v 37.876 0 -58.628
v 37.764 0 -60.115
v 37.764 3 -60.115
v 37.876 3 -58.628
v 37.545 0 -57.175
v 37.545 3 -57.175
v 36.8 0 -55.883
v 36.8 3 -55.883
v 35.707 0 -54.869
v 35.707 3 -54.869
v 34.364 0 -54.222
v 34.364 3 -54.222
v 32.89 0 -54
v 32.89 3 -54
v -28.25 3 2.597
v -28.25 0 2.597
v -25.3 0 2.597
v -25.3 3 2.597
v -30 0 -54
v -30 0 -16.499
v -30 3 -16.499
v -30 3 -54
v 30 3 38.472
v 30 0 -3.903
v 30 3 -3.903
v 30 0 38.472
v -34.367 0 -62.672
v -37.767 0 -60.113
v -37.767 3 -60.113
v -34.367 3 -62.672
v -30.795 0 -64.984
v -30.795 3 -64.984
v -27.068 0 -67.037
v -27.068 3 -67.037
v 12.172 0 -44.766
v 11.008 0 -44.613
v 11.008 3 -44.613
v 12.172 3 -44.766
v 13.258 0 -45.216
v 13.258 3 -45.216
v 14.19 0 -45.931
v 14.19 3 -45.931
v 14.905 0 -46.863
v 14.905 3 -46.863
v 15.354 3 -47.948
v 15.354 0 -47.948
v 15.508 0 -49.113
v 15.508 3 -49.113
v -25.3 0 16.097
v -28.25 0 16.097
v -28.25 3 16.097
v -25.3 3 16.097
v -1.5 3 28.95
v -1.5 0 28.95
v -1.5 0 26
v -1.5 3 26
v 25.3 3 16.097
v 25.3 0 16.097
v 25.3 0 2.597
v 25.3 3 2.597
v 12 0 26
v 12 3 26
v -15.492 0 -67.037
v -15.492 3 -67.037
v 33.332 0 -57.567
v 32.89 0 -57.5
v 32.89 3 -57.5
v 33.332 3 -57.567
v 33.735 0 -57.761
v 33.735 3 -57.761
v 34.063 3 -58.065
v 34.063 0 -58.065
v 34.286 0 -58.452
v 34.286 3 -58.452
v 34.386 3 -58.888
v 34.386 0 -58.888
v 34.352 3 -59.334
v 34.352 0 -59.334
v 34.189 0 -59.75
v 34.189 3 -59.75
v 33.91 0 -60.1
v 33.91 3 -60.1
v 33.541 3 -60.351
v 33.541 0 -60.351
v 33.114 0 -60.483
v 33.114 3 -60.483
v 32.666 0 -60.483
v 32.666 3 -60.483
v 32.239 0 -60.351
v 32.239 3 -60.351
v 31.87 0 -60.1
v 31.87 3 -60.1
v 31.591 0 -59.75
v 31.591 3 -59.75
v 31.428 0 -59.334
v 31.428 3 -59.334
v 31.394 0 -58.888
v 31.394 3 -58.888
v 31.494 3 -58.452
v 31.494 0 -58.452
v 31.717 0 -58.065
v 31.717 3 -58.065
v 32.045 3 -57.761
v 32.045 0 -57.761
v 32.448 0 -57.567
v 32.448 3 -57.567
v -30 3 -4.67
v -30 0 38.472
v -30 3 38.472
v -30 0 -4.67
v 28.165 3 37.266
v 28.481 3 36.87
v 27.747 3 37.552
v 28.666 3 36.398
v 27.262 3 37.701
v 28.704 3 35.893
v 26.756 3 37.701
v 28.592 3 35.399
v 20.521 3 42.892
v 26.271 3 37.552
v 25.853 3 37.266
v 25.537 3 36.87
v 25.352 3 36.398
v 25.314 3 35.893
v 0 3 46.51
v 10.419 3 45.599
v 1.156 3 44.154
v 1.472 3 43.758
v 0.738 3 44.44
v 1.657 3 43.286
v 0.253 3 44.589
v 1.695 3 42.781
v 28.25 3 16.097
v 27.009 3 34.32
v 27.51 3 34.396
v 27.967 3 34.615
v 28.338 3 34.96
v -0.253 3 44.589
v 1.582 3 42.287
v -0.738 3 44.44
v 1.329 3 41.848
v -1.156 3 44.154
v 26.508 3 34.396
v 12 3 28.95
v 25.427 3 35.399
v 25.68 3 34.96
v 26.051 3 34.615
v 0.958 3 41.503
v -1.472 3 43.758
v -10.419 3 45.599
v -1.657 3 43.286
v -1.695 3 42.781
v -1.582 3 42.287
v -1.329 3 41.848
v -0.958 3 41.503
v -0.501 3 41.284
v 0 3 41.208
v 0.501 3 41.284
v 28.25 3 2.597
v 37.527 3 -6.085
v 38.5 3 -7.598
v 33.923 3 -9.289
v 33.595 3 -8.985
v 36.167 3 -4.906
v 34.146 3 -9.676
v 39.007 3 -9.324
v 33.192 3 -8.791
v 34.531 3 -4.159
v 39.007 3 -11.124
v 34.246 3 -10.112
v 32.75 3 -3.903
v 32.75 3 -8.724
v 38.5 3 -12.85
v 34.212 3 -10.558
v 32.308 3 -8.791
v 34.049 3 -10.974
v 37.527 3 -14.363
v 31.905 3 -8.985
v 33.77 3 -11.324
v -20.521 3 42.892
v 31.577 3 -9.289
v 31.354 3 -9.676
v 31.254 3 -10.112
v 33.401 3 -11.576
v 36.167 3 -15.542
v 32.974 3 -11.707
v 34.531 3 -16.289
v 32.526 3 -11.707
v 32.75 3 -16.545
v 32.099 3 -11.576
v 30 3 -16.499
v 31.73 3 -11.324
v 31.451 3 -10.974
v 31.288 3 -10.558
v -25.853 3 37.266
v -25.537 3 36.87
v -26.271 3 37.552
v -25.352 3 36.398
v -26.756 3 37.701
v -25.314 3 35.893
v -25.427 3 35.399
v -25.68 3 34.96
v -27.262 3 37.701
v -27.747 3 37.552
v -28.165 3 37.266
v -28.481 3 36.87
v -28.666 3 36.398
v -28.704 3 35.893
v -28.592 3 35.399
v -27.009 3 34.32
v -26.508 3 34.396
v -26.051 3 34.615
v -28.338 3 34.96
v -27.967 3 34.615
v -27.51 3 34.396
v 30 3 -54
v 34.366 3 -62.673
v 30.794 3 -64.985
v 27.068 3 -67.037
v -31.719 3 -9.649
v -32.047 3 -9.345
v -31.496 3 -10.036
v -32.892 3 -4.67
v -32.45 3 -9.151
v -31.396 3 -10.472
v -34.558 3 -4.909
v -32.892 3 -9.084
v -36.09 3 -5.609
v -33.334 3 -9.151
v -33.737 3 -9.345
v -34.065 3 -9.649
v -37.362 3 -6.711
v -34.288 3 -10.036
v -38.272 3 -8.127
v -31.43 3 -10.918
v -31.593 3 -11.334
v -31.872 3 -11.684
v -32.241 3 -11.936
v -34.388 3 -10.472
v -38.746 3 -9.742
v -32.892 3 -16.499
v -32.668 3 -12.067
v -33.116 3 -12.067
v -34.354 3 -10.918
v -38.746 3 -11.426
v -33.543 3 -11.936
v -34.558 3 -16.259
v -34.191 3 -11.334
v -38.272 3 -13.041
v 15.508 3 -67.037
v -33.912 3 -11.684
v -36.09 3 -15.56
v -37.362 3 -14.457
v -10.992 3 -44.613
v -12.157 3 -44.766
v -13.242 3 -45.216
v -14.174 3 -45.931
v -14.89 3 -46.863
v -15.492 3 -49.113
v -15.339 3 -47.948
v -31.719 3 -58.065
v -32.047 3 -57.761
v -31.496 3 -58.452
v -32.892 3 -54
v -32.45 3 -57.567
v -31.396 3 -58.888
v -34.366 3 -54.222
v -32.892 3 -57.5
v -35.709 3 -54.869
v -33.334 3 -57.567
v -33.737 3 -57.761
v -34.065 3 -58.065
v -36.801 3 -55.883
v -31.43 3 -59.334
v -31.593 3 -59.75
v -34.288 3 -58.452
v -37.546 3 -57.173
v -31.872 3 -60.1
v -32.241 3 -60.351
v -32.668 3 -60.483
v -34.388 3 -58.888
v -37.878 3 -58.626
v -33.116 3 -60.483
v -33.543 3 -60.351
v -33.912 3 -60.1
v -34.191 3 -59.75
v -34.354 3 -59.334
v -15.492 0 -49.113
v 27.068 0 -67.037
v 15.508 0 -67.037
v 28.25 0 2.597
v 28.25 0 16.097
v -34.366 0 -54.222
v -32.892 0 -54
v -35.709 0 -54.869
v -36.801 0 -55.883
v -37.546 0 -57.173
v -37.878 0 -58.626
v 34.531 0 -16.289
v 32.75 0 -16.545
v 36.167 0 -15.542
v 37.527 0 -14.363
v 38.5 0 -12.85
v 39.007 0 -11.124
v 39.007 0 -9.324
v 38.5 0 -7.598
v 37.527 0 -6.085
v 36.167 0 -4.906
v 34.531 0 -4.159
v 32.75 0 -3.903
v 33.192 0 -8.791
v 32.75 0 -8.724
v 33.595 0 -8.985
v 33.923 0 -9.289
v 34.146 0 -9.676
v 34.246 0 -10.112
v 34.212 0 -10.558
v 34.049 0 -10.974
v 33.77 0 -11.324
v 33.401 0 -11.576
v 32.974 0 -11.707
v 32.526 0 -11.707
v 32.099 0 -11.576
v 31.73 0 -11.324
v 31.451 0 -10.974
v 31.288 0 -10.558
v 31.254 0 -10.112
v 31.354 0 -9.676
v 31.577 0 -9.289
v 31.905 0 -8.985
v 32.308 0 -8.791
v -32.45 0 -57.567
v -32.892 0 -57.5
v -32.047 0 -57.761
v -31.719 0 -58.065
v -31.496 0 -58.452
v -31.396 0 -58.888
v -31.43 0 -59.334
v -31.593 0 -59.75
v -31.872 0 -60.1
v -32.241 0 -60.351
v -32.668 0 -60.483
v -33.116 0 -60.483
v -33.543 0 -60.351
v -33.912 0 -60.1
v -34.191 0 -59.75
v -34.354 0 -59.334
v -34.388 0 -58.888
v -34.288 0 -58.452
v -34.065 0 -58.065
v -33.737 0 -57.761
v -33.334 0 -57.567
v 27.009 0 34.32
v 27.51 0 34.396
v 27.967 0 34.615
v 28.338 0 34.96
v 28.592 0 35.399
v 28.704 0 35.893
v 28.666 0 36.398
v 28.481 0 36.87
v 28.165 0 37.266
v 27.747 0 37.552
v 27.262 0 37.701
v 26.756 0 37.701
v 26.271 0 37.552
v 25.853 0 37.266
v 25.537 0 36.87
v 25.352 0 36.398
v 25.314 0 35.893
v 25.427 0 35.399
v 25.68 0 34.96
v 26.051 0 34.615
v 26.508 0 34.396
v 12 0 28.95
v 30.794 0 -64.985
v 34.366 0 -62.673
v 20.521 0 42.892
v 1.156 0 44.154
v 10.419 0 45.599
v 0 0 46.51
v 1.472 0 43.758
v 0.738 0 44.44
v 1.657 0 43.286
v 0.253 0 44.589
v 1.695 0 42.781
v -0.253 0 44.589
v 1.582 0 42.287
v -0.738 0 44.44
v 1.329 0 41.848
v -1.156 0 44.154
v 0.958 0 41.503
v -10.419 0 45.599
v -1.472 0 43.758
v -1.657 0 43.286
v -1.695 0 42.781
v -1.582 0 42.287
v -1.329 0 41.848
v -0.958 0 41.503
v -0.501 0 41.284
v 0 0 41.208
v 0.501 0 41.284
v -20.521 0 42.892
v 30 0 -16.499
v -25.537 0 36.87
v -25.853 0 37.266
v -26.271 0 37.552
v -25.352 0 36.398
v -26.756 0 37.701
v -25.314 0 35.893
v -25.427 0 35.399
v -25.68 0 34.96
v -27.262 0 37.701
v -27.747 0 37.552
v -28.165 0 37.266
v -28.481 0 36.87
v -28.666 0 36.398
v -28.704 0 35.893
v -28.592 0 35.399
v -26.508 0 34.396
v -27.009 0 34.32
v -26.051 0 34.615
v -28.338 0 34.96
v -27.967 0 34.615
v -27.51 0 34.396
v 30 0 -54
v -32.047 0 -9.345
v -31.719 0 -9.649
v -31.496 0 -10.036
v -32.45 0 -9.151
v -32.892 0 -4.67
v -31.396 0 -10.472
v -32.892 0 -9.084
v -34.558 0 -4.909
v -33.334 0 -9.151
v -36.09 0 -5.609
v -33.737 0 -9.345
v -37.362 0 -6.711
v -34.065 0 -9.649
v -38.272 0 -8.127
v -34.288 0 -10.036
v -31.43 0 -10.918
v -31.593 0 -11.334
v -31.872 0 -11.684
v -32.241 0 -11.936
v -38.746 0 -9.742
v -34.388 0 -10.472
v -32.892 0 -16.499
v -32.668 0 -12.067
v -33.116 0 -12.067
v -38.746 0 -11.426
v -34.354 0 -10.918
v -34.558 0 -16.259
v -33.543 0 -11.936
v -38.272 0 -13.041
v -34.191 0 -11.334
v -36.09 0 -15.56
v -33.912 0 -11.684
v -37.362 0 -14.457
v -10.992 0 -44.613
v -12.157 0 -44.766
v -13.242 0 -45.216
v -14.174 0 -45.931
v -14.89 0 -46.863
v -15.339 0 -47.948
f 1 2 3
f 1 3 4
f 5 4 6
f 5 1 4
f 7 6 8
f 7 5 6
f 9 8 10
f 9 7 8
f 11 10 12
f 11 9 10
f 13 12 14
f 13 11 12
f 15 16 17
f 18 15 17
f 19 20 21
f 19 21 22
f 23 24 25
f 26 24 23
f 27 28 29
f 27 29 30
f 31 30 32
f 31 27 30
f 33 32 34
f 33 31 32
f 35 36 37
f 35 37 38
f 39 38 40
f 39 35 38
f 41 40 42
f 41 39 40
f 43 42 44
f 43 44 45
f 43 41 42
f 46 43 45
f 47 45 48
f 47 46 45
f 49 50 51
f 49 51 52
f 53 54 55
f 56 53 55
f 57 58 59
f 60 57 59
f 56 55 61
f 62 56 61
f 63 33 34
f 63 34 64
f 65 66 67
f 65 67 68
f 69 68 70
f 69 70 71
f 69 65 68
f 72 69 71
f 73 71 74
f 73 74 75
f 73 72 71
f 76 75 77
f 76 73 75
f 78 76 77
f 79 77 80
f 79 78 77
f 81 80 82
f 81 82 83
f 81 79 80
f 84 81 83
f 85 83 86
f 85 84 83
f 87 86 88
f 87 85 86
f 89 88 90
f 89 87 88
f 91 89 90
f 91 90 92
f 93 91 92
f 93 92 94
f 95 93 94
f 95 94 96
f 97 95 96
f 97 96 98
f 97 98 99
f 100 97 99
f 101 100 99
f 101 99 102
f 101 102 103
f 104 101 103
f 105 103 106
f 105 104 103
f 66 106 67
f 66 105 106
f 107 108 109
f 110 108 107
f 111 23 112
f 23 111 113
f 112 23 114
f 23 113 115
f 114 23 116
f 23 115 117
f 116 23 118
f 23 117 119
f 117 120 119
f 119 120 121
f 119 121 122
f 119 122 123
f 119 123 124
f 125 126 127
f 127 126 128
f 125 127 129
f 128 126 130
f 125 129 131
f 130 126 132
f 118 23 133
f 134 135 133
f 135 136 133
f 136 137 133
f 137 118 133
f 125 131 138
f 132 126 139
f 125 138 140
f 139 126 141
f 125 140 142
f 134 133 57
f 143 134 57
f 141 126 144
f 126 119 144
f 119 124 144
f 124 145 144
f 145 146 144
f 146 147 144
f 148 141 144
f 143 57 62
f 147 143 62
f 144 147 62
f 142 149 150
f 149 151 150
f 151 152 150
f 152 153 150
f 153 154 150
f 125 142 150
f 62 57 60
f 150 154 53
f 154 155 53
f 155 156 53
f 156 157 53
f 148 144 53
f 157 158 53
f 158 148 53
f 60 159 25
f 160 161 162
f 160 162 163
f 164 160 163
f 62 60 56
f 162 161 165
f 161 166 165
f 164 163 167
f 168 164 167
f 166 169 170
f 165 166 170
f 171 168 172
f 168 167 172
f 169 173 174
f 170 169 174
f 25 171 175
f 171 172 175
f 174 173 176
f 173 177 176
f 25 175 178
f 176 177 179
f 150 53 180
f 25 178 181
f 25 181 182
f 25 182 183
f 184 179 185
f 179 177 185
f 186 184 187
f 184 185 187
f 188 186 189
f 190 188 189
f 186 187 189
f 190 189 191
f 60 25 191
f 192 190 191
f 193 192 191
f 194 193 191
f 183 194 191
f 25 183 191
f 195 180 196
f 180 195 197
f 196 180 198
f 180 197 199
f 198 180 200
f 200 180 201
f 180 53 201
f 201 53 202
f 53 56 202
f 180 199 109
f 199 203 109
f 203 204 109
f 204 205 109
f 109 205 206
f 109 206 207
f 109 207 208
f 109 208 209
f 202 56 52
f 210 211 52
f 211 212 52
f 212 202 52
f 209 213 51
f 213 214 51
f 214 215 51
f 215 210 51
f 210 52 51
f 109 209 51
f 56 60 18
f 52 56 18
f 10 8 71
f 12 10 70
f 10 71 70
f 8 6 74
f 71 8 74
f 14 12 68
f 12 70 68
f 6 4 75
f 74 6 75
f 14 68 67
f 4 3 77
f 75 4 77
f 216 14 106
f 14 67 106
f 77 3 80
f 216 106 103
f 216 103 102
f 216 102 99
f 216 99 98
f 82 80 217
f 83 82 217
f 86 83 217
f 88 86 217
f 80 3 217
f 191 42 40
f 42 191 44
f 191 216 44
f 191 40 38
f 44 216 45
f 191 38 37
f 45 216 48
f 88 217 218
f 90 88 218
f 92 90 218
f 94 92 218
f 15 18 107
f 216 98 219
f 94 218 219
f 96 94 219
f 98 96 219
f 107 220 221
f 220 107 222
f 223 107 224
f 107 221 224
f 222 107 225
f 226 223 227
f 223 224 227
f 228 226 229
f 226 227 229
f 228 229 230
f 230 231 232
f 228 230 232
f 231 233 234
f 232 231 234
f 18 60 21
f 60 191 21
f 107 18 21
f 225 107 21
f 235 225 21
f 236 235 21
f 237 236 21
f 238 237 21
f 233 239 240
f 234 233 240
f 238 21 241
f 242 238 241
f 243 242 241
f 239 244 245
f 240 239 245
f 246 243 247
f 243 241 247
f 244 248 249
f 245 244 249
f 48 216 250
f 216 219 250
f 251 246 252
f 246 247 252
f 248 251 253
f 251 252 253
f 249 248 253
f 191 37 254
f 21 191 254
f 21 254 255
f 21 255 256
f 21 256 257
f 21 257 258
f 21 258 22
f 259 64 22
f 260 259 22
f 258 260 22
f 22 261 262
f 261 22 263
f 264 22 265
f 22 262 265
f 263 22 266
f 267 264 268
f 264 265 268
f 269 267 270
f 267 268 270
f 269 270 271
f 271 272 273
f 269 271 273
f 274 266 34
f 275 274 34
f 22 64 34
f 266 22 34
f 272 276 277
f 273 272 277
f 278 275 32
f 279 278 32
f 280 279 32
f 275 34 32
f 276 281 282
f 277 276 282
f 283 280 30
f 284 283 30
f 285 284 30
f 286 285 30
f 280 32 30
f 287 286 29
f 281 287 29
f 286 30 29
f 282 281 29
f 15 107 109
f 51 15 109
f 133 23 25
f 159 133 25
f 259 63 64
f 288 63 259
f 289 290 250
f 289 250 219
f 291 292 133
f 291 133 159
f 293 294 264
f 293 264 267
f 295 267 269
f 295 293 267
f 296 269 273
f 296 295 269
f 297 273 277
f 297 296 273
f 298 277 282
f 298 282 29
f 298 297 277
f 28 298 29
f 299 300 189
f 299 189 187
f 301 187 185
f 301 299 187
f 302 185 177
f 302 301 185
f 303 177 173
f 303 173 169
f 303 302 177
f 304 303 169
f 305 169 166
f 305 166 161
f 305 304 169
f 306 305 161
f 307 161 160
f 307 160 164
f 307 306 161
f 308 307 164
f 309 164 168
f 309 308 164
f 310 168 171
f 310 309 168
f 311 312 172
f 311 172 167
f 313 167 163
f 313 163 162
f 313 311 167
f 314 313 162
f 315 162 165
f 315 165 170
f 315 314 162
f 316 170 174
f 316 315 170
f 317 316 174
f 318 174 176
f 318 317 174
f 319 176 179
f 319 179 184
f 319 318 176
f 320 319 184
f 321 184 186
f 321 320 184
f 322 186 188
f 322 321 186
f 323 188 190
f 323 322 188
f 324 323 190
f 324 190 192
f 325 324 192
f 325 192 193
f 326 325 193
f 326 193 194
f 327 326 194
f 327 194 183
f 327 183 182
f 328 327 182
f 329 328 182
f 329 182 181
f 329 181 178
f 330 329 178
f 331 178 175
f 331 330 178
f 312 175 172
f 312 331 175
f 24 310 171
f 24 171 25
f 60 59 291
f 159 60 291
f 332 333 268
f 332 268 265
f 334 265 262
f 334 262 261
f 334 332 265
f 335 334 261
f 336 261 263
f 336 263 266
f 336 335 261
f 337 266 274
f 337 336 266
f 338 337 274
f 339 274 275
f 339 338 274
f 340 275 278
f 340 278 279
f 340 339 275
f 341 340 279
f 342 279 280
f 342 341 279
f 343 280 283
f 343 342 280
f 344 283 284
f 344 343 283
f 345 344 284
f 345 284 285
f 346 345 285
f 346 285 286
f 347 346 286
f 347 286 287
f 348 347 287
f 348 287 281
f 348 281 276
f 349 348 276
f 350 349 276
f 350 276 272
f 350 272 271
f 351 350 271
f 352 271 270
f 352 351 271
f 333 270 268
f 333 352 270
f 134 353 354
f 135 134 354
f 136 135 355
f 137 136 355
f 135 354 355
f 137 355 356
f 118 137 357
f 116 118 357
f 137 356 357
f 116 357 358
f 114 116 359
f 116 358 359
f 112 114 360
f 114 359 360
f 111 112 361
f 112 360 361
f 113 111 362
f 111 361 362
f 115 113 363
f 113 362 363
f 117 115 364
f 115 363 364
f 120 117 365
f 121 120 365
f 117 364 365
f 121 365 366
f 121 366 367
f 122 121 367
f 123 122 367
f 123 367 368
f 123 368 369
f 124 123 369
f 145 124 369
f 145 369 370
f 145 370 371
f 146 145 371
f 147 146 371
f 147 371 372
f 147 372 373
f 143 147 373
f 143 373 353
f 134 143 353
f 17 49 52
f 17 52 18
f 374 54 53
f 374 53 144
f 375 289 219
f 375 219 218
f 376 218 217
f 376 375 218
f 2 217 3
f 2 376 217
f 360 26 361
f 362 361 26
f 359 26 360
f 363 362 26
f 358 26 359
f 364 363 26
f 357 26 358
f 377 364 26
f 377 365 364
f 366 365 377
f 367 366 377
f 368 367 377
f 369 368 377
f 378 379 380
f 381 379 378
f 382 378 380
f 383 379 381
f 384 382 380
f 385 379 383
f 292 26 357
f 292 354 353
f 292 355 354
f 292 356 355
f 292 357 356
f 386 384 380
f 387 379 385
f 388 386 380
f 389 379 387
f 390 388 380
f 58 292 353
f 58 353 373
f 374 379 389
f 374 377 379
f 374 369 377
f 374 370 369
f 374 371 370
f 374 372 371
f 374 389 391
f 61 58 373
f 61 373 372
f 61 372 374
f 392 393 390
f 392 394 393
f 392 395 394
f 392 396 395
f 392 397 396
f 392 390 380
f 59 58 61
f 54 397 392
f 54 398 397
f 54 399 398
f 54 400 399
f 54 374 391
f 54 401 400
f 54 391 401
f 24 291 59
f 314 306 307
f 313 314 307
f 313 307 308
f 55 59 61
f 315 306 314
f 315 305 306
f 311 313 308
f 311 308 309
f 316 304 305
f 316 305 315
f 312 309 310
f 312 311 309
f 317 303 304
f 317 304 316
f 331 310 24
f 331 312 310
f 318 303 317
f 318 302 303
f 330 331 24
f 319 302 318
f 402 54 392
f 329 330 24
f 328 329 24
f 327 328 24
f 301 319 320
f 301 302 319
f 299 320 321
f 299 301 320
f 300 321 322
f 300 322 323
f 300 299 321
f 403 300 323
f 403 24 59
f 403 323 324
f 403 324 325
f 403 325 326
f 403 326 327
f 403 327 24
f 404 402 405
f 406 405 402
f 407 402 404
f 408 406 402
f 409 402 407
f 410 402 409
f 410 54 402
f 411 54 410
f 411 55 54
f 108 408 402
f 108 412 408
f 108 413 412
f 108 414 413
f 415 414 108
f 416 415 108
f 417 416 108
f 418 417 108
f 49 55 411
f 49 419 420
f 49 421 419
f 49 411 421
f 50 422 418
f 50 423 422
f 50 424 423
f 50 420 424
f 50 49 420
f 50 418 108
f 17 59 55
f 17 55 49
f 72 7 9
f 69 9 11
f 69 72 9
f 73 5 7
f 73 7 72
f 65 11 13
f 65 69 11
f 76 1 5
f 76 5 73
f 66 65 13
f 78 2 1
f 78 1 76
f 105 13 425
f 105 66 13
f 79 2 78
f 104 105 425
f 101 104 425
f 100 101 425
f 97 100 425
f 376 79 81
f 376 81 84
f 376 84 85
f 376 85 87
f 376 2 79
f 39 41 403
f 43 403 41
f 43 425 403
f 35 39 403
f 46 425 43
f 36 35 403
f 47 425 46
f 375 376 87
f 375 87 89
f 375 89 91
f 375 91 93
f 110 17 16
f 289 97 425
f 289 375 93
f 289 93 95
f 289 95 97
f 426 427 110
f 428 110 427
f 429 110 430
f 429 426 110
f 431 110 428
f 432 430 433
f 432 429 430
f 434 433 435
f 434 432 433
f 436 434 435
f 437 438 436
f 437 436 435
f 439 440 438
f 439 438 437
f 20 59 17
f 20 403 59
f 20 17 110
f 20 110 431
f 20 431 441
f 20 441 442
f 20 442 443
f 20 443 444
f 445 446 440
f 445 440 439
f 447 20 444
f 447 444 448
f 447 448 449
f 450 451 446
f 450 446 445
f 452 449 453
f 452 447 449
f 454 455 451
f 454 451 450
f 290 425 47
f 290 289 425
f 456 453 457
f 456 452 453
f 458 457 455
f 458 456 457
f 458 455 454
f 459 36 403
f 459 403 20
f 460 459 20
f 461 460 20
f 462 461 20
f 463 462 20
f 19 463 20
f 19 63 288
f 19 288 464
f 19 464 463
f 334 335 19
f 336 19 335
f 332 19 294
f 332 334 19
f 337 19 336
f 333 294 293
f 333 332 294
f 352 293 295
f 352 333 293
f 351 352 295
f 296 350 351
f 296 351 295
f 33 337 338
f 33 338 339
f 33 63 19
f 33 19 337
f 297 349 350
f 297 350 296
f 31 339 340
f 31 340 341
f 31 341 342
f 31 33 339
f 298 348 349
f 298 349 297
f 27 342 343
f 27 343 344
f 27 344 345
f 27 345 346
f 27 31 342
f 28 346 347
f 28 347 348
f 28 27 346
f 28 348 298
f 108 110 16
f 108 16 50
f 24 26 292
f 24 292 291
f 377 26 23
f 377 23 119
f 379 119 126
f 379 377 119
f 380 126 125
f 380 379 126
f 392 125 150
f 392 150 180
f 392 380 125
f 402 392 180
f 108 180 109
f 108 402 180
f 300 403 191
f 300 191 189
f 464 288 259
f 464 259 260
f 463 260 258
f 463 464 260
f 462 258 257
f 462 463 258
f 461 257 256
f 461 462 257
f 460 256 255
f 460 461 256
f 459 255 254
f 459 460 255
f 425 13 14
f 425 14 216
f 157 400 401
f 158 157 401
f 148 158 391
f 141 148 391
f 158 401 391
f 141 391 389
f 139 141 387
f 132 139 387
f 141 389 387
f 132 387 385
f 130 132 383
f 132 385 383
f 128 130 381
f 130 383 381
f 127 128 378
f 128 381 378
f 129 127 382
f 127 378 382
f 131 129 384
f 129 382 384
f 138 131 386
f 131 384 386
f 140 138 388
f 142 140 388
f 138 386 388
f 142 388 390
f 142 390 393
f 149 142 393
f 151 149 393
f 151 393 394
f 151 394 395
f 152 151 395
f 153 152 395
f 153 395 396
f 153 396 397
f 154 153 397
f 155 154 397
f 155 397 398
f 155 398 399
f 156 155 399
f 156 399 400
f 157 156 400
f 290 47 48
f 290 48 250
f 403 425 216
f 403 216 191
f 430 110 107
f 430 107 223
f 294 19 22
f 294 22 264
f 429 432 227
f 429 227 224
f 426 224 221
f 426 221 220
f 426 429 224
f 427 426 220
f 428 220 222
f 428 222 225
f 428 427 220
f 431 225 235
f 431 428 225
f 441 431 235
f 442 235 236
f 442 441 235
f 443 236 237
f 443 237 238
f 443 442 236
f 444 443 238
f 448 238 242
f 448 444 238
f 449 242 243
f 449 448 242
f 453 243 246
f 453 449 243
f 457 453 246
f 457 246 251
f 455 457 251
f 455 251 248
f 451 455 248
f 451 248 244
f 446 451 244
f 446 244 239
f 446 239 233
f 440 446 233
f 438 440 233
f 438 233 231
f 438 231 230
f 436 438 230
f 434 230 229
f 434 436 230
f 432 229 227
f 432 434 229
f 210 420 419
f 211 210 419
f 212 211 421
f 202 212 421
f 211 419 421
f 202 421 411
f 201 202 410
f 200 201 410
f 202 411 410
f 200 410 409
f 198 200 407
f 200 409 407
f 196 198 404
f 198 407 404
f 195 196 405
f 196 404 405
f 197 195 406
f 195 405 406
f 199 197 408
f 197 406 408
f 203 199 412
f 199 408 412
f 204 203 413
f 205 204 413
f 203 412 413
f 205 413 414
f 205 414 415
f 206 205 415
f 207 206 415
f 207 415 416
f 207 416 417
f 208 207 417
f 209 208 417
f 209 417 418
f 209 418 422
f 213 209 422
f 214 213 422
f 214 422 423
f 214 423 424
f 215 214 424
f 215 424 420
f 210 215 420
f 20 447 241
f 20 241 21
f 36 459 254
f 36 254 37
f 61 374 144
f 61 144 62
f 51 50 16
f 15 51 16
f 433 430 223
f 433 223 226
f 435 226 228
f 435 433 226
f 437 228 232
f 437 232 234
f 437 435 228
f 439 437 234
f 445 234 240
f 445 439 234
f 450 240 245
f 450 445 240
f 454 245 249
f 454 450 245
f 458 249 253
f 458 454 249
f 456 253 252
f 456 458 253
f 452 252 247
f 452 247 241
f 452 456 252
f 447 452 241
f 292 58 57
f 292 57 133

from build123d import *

# Parameters (mm, degrees)
CROQUIS1_R                   = 1.5
CROQUIS1_W                   = 2.95
CROQUIS1_H                   = 13.5
CROQUIS1_W_2                 = 13.5
CROQUIS1_H_2                 = 2.95
SALIENTE_EXTRUIR1_DEPTH      = 3
TALADRO_DE_MARGEN_PARA_M31_D = 3.4


with BuildPart() as part:
    # Croquis1 → Saliente-Extruir1 (new body)
    with BuildSketch(Plane(origin=(0, 0, 0), x_dir=(1, 0, 0), z_dir=(0, 1, 0))):
        with BuildLine():
            Line((-30, -38.4717102), (-30, 4.669623367))
            Line((-30, 4.669623367), (-32.892040435, 4.669623367))
            ThreePointArc((-32.892040435, 4.669623367), (-38.806634145, 10.584217077), (-32.892040435, 16.498810786))
            Line((-32.892040435, 16.498810786), (-30, 16.498810786))
            Line((-30, 16.498810786), (-30, 45))
            Line((-30, 45), (-30, 54))
            Line((-30, 54), (-32.892040435, 54))
            ThreePointArc((-32.892040435, 54), (-36.801169554, 55.882515512), (-37.766700191, 60.112516186))
            ThreePointArc((-37.766700191, 60.112516186), (-32.601856319, 63.859635989), (-27.068280751, 67.037065844))
            Line((-27.068280751, 67.037065844), (-15.492425724, 67.037065844))
            Line((-15.492425724, 67.037065844), (-15.492425724, 55.619045247))
            Line((-15.492425724, 55.619045247), (-15.492425724, 49.113101928))
            ThreePointArc((-15.492425724, 49.113101928), (-14.174406239, 45.931121412), (-10.992425724, 44.613101928))
            Line((-10.992425724, 44.613101928), (11.007574276, 44.613101928))
            ThreePointArc((11.007574276, 44.613101928), (14.189554792, 45.931121412), (15.507574276, 49.113101928))
            Line((15.507574276, 49.113101928), (15.507574276, 55.631560476))
            Line((15.507574276, 55.631560476), (15.507574276, 67.037065844))
            Line((15.507574276, 67.037065844), (27.068280751, 67.037065844))
            ThreePointArc((27.068280751, 67.037065844), (32.60050386, 63.860511342), (37.764196466, 60.114544216))
            ThreePointArc((37.764196466, 60.114544216), (36.799777556, 55.883328786), (32.89, 54))
            Line((32.89, 54), (30, 54))
            Line((30, 54), (30, 45))
            Line((30, 45), (30, 16.498810786))
            Line((30, 16.498810786), (32.75, 16.545073224))
            ThreePointArc((32.75, 16.545073224), (39.071015067, 10.224058157), (32.75, 3.90304309))
            Line((32.75, 3.90304309), (30, 3.90304309))
            Line((30, 3.90304309), (30, -38.4717102))
            ThreePointArc((30, -38.4717102), (0, -46.510185973), (-30, -38.4717102))
        make_face()
        with Locations(Location((-32.892040435, 10.584217077, 0), (0, 0, 270))):
            Circle(CROQUIS1_R, mode=Mode.SUBTRACT)
        with Locations(Location((32.75, 10.224058157, 0), (0, 0, 270))):
            Circle(CROQUIS1_R, mode=Mode.SUBTRACT)
        with Locations(Location((-32.892040435, 59, 0), (0, 0, 270))):
            Circle(CROQUIS1_R, mode=Mode.SUBTRACT)
        with Locations(Location((32.89, 59, 0), (0, 0, 270))):
            Circle(CROQUIS1_R, mode=Mode.SUBTRACT)
        with Locations((-26.775, -9.34695691)):
            Rectangle(CROQUIS1_W, CROQUIS1_H, mode=Mode.SUBTRACT)
        with Locations((26.775, -9.34695691)):
            Rectangle(CROQUIS1_W, CROQUIS1_H, mode=Mode.SUBTRACT)
        with Locations((5.25, -27.475)):
            Rectangle(CROQUIS1_W_2, CROQUIS1_H_2, mode=Mode.SUBTRACT)
    extrude(amount=SALIENTE_EXTRUIR1_DEPTH)

    # Taladro de margen para M31 (through all)
    with Locations(Plane(origin=(-27.009031687, 3, 36.020030417), x_dir=(0, 0, 1), z_dir=(0, 1, 0))):
        with Locations((0, 0), (6.887961272, 27.009031687), (0, 54.018063374)):
            Hole(TALADRO_DE_MARGEN_PARA_M31_D / 2)


solid = part.part
